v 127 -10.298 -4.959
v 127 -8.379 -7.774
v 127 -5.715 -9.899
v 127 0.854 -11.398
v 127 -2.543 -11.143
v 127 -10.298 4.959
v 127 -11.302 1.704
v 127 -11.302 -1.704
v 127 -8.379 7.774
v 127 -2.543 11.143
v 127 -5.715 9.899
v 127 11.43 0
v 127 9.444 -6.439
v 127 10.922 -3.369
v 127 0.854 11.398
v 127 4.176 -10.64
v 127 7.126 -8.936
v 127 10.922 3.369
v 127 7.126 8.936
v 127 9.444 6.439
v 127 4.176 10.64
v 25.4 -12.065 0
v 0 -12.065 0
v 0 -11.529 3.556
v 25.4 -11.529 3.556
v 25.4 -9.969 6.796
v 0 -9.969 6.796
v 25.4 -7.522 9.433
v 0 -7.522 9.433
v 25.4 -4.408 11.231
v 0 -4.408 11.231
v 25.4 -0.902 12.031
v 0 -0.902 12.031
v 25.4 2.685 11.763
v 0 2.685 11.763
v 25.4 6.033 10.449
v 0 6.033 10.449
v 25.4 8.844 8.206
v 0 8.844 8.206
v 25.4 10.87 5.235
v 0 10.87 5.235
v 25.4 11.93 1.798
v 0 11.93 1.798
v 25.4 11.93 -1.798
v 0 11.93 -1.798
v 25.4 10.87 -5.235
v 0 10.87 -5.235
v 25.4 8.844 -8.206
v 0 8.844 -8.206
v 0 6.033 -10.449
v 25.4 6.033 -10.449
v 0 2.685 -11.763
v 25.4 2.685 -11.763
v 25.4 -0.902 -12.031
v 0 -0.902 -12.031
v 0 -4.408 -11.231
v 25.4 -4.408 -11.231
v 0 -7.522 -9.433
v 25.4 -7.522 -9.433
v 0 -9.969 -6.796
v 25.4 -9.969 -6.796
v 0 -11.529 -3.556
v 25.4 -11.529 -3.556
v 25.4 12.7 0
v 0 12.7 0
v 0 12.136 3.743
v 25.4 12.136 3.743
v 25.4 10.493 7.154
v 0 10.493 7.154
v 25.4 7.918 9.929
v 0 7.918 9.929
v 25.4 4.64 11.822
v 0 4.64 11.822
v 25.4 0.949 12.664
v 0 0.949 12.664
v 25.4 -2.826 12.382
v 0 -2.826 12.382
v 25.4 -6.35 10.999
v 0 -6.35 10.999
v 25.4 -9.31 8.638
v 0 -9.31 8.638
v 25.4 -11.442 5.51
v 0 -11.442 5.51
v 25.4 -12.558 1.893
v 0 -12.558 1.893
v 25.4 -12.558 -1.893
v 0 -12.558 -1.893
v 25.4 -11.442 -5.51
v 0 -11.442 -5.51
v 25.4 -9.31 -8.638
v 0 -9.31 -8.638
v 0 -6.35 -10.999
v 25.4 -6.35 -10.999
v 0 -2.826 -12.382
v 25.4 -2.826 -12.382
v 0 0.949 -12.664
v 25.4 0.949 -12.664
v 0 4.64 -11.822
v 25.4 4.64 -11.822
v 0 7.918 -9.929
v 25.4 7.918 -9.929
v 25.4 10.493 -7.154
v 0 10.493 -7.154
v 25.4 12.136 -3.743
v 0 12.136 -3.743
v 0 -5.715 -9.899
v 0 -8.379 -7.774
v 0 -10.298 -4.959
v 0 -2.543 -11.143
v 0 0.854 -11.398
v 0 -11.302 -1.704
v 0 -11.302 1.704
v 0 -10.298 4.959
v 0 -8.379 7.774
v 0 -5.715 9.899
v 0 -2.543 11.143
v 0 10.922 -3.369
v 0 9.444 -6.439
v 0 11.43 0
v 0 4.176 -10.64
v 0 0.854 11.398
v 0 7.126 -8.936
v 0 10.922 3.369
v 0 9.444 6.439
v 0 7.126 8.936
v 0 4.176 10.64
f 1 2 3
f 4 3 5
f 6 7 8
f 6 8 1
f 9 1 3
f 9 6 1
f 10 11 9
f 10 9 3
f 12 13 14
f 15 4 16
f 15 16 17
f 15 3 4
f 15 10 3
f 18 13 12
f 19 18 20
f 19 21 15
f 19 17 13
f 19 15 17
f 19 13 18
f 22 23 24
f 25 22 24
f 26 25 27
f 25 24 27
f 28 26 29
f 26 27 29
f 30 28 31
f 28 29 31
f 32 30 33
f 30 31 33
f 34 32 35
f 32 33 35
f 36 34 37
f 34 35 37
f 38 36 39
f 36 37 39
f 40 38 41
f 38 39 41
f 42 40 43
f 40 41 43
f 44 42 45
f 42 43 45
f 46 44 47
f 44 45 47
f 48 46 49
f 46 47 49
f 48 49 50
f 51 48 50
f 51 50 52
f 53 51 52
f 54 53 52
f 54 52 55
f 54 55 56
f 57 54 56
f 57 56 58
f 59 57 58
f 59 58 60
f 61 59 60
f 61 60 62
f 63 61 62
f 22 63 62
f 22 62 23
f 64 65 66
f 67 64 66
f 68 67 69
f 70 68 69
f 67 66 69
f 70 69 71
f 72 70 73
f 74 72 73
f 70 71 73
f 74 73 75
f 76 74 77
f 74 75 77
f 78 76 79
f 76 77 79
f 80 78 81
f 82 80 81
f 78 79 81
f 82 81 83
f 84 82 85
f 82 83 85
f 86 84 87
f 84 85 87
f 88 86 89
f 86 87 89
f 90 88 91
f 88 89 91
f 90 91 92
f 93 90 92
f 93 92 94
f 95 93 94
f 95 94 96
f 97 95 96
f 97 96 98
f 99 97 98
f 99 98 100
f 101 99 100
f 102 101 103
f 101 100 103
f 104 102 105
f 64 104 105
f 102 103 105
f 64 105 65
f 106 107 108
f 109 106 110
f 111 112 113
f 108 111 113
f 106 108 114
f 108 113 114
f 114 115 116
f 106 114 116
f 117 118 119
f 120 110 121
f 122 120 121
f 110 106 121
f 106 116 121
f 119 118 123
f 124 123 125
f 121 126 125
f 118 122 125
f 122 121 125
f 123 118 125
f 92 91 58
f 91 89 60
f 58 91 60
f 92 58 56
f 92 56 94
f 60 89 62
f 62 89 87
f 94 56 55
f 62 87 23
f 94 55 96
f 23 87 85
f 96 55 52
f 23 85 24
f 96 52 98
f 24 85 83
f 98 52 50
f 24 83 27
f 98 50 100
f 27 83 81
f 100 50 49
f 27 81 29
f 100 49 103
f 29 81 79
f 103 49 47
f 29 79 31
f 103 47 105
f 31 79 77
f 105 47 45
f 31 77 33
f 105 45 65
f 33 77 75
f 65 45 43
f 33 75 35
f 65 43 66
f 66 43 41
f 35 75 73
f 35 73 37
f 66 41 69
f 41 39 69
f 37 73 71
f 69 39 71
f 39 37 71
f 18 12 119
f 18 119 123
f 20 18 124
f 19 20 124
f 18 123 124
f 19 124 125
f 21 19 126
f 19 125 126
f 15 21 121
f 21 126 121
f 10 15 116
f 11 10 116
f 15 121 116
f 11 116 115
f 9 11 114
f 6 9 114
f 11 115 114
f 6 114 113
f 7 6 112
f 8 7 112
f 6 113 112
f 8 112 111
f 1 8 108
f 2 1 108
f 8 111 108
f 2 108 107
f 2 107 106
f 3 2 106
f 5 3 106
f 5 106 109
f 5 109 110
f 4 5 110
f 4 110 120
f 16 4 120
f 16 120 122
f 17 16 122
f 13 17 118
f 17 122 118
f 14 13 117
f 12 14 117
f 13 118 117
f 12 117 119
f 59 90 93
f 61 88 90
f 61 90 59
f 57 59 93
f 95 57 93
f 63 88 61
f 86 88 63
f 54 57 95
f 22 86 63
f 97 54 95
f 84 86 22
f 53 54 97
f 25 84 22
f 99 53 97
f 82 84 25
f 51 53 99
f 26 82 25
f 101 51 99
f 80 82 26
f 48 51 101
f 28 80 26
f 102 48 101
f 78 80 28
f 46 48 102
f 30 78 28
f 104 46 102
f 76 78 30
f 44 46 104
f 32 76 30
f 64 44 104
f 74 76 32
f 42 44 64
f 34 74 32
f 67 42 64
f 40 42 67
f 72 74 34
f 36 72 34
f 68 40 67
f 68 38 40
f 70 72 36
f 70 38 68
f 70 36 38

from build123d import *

# Parameters (mm, degrees)
F0_R     = 12.7
F1_DEPTH = 25.4
F3_D     = 24.13
F4_R     = 11.43
F5_DEPTH = 127


# Not quite as in the source:
# - the program builds the solid bodies; features that only make, move or delete a surface that nothing else refers to are left out


with BuildPart() as f1:
    # F0 (on Right) → F1 (new body)
    with BuildSketch(Plane.YZ):
        Circle(F0_R)
    extrude(amount=F1_DEPTH)

    # F3 (through all)
    with Locations(Plane.YZ.offset(25.4)):
        with Locations((0, 0)):
            Hole(F3_D / 2)


with BuildPart() as f5:
    # F4 (on Right) → F5 (new body)
    with BuildSketch(Plane.YZ):
        Circle(F4_R)
    extrude(amount=F5_DEPTH)


solid = Compound([f1.part, f5.part])
